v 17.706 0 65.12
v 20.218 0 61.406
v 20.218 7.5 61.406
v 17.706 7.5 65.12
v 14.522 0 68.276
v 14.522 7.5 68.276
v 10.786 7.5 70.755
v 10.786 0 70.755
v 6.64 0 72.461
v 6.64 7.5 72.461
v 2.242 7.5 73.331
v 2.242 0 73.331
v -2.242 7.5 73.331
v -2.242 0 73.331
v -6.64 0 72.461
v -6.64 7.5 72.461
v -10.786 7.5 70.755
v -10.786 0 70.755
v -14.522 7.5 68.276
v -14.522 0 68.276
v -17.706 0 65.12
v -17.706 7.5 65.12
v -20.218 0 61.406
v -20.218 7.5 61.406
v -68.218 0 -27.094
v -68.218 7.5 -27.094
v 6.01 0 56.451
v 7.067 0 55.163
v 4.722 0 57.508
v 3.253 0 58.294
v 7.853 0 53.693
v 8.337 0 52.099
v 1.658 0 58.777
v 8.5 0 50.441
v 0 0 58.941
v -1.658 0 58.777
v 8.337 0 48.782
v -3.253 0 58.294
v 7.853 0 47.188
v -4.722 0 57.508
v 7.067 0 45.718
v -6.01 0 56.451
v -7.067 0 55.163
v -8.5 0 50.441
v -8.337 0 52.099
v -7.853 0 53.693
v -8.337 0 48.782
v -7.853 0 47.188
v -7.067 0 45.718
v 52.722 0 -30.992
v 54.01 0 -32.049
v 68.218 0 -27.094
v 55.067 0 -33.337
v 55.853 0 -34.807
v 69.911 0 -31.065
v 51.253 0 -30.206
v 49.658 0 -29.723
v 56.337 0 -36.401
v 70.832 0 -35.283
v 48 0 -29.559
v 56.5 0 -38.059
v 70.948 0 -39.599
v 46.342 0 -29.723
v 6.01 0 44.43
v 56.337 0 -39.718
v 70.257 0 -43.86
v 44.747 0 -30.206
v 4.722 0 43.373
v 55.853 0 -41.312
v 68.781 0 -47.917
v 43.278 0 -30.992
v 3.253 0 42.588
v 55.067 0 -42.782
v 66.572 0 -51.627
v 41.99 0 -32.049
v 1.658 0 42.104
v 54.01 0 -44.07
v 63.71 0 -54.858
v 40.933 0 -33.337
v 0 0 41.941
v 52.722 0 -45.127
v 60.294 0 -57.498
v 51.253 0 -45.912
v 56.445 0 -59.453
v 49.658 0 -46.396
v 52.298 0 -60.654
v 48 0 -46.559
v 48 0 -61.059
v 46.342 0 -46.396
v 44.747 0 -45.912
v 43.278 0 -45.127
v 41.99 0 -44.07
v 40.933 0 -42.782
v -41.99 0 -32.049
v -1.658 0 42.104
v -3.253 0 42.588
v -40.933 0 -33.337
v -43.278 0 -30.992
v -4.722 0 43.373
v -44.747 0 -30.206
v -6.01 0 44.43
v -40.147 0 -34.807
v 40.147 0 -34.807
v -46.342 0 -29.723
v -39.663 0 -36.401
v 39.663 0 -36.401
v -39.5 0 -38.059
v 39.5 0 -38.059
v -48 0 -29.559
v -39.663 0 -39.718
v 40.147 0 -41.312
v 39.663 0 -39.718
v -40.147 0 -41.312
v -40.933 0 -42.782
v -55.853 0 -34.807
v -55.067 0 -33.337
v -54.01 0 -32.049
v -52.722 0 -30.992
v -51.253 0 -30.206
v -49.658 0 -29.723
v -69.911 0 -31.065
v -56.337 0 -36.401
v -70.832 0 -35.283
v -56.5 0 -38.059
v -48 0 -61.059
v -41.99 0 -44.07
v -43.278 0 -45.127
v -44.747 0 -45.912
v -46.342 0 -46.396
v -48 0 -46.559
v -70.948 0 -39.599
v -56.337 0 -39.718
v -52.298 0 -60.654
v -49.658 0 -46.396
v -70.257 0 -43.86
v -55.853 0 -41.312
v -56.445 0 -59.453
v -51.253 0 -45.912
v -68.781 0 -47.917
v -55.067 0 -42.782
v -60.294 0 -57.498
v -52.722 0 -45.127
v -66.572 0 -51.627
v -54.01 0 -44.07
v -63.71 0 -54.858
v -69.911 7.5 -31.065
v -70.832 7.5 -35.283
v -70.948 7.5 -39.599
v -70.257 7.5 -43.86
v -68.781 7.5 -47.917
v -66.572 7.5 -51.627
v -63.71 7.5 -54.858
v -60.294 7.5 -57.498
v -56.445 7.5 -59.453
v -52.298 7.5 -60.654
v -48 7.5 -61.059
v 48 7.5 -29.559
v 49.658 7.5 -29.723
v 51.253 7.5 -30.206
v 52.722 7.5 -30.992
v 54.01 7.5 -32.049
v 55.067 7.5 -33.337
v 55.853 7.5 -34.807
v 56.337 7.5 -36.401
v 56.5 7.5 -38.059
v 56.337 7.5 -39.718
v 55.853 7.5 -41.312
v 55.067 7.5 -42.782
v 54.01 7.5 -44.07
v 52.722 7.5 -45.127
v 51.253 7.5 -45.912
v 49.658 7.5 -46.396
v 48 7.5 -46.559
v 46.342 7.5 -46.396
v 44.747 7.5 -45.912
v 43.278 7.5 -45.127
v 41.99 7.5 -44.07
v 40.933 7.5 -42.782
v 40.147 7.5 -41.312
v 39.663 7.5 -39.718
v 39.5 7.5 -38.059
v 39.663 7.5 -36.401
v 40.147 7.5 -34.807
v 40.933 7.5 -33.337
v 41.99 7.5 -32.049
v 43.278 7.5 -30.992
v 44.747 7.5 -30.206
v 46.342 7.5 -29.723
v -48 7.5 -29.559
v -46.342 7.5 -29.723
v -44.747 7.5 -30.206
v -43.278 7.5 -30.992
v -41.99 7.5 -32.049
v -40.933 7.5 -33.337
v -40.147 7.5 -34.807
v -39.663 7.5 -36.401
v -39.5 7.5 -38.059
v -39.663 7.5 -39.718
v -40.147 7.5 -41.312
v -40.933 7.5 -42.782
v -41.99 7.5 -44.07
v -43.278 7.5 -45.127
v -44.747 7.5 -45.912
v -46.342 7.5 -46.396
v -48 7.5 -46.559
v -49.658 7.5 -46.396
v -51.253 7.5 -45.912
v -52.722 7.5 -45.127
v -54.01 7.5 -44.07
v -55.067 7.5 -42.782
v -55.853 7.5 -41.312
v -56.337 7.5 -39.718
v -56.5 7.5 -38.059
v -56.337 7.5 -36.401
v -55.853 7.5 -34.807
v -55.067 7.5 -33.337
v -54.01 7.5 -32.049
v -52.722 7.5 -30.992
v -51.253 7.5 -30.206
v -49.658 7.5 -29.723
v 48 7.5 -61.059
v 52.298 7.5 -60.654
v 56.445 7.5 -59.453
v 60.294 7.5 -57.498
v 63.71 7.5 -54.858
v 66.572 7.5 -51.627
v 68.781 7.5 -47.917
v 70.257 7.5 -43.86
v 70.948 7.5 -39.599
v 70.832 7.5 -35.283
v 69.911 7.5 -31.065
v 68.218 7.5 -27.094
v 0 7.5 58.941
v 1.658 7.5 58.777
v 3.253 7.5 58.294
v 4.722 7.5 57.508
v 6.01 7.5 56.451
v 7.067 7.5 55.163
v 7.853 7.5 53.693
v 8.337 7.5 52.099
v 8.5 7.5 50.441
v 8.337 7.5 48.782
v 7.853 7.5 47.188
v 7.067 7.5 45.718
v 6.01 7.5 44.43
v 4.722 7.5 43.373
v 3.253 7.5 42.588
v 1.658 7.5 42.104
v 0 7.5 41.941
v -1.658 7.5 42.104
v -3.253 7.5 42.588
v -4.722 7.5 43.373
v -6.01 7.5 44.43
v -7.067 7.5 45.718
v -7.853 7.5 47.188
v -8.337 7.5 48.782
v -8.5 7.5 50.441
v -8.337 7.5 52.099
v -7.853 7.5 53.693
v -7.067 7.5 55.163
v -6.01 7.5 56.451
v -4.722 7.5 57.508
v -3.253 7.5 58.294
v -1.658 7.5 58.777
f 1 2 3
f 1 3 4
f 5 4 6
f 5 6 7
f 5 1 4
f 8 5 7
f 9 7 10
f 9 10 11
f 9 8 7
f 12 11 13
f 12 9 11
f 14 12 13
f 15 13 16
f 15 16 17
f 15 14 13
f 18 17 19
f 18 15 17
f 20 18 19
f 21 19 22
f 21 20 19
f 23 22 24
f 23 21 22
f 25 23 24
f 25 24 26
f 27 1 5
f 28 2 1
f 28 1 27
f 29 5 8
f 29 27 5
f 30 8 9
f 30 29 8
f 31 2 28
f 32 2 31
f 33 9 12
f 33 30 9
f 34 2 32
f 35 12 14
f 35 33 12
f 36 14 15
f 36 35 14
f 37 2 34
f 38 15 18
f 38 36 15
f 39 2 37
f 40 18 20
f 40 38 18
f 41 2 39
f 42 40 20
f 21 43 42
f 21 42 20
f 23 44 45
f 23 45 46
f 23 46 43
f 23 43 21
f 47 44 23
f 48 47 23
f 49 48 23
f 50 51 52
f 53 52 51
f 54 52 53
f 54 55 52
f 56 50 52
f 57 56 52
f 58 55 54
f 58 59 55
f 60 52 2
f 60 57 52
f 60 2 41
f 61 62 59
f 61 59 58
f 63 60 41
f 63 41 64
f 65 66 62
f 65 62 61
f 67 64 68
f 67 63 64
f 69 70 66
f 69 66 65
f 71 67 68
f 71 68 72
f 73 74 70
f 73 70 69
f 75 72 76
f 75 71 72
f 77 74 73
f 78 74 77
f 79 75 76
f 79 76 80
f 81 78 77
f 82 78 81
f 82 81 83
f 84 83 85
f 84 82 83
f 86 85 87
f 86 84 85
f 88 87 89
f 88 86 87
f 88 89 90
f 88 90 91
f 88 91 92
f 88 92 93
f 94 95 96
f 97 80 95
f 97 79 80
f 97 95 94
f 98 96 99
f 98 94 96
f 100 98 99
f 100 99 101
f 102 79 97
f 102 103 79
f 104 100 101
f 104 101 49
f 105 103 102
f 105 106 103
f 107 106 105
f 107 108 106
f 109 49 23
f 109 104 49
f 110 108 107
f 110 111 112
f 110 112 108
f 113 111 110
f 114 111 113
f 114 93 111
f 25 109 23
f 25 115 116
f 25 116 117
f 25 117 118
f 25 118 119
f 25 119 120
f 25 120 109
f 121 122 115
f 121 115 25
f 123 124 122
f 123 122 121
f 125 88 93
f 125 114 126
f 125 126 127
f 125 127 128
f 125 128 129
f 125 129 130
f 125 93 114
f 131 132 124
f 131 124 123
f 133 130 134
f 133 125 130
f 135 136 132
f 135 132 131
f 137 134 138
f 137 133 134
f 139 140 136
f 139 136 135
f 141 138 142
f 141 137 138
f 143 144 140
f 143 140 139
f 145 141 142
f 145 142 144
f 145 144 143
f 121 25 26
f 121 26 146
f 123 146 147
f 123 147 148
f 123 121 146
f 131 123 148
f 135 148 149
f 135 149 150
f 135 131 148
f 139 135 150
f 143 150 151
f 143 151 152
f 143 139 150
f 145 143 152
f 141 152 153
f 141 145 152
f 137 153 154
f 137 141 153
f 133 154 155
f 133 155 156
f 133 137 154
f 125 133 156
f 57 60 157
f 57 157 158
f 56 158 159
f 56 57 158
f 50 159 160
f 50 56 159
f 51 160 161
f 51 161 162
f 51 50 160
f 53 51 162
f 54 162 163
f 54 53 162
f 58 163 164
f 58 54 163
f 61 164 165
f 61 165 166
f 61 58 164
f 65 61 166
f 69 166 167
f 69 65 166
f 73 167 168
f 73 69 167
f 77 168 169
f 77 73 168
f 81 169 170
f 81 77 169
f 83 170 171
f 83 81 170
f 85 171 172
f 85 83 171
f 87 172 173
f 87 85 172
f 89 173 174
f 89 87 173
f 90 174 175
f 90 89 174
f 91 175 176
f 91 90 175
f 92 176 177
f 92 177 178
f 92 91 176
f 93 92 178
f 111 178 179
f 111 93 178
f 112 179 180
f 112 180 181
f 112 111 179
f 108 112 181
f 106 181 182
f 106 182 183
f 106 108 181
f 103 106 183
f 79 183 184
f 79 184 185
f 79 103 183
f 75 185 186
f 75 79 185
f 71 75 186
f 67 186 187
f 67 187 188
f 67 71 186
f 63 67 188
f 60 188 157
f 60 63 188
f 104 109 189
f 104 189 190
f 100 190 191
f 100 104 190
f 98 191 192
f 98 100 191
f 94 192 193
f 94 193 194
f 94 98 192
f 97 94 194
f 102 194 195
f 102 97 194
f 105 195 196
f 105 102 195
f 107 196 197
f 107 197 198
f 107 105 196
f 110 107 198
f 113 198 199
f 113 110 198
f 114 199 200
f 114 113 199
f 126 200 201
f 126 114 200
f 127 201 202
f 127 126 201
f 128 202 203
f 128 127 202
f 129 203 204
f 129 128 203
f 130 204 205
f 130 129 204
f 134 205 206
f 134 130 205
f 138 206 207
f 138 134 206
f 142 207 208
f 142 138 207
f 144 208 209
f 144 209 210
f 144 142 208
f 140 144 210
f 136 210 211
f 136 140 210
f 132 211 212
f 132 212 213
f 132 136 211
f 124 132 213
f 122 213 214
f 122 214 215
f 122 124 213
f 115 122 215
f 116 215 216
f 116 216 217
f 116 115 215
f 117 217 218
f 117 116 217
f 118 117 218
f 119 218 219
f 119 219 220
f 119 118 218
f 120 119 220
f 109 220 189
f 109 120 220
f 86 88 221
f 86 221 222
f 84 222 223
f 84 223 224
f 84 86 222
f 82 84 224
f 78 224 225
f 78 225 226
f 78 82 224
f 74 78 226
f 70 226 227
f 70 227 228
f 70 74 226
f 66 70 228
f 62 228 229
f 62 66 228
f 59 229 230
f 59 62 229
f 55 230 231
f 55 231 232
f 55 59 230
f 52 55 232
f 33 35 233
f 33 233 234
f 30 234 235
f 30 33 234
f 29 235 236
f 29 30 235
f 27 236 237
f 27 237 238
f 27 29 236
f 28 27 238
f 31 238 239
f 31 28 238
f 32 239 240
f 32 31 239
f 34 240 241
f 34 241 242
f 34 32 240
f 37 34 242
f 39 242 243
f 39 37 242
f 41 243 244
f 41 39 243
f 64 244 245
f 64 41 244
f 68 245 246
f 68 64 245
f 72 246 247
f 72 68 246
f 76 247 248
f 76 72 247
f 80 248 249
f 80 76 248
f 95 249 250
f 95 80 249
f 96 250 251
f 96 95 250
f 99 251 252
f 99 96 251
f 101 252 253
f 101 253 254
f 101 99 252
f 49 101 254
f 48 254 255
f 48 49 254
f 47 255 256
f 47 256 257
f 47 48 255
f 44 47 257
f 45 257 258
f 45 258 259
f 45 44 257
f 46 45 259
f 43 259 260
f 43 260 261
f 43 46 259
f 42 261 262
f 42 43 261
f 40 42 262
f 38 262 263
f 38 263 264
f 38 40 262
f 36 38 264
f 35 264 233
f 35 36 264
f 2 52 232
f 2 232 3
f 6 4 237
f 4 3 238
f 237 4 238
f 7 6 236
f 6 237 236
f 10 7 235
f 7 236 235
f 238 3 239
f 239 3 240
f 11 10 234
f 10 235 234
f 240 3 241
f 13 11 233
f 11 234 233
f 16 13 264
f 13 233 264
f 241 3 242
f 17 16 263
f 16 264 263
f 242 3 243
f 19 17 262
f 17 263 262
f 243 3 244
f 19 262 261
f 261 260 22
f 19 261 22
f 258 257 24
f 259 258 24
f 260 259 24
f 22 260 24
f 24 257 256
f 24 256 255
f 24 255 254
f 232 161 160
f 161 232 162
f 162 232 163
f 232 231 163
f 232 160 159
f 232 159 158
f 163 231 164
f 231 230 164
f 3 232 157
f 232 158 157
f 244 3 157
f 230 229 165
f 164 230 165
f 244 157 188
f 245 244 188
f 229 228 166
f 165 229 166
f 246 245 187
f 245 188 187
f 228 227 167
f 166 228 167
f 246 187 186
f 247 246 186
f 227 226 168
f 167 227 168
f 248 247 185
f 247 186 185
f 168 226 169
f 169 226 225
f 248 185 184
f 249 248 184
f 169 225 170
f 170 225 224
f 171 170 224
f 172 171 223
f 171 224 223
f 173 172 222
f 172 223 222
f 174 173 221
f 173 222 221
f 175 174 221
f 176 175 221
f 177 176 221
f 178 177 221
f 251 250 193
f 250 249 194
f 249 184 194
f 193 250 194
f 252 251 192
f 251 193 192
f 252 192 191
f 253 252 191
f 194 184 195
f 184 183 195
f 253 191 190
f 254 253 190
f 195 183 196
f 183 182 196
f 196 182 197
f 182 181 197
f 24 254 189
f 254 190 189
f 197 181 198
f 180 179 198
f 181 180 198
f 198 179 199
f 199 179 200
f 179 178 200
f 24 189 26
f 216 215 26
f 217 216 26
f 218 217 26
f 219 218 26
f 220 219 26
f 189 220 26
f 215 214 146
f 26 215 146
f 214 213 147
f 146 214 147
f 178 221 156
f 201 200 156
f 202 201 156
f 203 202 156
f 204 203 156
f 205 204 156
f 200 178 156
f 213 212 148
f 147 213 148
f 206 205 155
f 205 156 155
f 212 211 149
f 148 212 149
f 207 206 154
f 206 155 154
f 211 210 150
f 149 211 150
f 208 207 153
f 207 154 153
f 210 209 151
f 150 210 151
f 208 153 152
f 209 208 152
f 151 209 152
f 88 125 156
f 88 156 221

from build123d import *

# Parameters (mm, degrees)
SKETCH2_R           = 8.5
BOSS_EXTRUDE1_DEPTH = 7.5


with BuildPart() as part:
    # Sketch2 → Boss-Extrude1 (new body)
    with BuildSketch(Plane(origin=(0, 0, 0), x_dir=(1, 0, 0), z_dir=(0, 1, 0))):
        with BuildLine():
            Line((-48, 61.059418618), (48, 61.059418618))
            ThreePointArc((48, 61.059418618), (67.763699658, 49.82360902), (68.217732681, 27.093868689))
            Line((68.217732681, 27.093868689), (20.217732681, -61.406131311))
            ThreePointArc((20.217732681, -61.406131311), (0, -73.440581382), (-20.217732681, -61.406131311))
            Line((-20.217732681, -61.406131311), (-68.217732681, 27.093868689))
            ThreePointArc((-68.217732681, 27.093868689), (-67.763699658, 49.82360902), (-48, 61.059418618))
        make_face()
        with Locations(Location((48, 38.059418618, 0), (0, 0, 270))):
            Circle(SKETCH2_R, mode=Mode.SUBTRACT)
        with Locations(Location((0, -50.440581382, 0), (0, 0, 270))):
            Circle(SKETCH2_R, mode=Mode.SUBTRACT)
        with Locations(Location((-48, 38.059418618, 0), (0, 0, 270))):
            Circle(SKETCH2_R, mode=Mode.SUBTRACT)
    extrude(amount=BOSS_EXTRUDE1_DEPTH)


solid = part.part
